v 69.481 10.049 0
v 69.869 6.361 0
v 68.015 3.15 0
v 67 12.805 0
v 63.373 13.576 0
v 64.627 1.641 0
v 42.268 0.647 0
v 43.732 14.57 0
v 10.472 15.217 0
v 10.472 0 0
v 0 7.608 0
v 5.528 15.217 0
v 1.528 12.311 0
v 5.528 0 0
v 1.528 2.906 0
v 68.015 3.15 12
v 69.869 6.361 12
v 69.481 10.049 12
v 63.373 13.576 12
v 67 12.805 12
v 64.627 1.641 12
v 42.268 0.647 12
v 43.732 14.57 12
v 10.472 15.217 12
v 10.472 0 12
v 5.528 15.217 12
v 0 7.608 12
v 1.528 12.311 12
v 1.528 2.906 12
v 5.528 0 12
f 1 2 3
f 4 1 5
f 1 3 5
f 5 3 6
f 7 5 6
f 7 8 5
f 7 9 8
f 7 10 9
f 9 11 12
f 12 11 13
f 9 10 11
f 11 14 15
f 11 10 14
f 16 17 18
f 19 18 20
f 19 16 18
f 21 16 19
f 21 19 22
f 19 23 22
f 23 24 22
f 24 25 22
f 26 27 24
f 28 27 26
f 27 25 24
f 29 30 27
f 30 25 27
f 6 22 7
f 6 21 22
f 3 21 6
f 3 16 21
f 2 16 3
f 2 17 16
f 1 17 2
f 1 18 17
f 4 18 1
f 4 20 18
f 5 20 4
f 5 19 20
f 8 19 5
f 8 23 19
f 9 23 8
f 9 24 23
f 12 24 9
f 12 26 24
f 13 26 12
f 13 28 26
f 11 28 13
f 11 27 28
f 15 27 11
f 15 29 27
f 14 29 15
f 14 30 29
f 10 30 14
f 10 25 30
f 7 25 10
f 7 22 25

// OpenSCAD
$fn = 32;

// ----------------------------------------------------------------------
// Lever arm: two bosses 16 and 14 mm, 35 mm between centres
// ----------------------------------------------------------------------

// --- parameters (mm) ---
profile_height = 12;      // extrusion height
profile_points = 15;      // points of the closed outline

profile = [[0, 7.608], [1.528, 2.906], [5.528, 0], [10.472, 0], [42.268, 0.647], [64.627, 1.641], [68.015, 3.15], [69.869, 6.361], [69.481, 10.049], [67, 12.805], [63.373, 13.576], [43.732, 14.57], [10.472, 15.217], [5.528, 15.217], [1.528, 12.311]];  // single closed polygon, 15 points, counter clockwise

// --- the one profile operation ---
linear_extrude(height = profile_height) polygon(points = profile);
